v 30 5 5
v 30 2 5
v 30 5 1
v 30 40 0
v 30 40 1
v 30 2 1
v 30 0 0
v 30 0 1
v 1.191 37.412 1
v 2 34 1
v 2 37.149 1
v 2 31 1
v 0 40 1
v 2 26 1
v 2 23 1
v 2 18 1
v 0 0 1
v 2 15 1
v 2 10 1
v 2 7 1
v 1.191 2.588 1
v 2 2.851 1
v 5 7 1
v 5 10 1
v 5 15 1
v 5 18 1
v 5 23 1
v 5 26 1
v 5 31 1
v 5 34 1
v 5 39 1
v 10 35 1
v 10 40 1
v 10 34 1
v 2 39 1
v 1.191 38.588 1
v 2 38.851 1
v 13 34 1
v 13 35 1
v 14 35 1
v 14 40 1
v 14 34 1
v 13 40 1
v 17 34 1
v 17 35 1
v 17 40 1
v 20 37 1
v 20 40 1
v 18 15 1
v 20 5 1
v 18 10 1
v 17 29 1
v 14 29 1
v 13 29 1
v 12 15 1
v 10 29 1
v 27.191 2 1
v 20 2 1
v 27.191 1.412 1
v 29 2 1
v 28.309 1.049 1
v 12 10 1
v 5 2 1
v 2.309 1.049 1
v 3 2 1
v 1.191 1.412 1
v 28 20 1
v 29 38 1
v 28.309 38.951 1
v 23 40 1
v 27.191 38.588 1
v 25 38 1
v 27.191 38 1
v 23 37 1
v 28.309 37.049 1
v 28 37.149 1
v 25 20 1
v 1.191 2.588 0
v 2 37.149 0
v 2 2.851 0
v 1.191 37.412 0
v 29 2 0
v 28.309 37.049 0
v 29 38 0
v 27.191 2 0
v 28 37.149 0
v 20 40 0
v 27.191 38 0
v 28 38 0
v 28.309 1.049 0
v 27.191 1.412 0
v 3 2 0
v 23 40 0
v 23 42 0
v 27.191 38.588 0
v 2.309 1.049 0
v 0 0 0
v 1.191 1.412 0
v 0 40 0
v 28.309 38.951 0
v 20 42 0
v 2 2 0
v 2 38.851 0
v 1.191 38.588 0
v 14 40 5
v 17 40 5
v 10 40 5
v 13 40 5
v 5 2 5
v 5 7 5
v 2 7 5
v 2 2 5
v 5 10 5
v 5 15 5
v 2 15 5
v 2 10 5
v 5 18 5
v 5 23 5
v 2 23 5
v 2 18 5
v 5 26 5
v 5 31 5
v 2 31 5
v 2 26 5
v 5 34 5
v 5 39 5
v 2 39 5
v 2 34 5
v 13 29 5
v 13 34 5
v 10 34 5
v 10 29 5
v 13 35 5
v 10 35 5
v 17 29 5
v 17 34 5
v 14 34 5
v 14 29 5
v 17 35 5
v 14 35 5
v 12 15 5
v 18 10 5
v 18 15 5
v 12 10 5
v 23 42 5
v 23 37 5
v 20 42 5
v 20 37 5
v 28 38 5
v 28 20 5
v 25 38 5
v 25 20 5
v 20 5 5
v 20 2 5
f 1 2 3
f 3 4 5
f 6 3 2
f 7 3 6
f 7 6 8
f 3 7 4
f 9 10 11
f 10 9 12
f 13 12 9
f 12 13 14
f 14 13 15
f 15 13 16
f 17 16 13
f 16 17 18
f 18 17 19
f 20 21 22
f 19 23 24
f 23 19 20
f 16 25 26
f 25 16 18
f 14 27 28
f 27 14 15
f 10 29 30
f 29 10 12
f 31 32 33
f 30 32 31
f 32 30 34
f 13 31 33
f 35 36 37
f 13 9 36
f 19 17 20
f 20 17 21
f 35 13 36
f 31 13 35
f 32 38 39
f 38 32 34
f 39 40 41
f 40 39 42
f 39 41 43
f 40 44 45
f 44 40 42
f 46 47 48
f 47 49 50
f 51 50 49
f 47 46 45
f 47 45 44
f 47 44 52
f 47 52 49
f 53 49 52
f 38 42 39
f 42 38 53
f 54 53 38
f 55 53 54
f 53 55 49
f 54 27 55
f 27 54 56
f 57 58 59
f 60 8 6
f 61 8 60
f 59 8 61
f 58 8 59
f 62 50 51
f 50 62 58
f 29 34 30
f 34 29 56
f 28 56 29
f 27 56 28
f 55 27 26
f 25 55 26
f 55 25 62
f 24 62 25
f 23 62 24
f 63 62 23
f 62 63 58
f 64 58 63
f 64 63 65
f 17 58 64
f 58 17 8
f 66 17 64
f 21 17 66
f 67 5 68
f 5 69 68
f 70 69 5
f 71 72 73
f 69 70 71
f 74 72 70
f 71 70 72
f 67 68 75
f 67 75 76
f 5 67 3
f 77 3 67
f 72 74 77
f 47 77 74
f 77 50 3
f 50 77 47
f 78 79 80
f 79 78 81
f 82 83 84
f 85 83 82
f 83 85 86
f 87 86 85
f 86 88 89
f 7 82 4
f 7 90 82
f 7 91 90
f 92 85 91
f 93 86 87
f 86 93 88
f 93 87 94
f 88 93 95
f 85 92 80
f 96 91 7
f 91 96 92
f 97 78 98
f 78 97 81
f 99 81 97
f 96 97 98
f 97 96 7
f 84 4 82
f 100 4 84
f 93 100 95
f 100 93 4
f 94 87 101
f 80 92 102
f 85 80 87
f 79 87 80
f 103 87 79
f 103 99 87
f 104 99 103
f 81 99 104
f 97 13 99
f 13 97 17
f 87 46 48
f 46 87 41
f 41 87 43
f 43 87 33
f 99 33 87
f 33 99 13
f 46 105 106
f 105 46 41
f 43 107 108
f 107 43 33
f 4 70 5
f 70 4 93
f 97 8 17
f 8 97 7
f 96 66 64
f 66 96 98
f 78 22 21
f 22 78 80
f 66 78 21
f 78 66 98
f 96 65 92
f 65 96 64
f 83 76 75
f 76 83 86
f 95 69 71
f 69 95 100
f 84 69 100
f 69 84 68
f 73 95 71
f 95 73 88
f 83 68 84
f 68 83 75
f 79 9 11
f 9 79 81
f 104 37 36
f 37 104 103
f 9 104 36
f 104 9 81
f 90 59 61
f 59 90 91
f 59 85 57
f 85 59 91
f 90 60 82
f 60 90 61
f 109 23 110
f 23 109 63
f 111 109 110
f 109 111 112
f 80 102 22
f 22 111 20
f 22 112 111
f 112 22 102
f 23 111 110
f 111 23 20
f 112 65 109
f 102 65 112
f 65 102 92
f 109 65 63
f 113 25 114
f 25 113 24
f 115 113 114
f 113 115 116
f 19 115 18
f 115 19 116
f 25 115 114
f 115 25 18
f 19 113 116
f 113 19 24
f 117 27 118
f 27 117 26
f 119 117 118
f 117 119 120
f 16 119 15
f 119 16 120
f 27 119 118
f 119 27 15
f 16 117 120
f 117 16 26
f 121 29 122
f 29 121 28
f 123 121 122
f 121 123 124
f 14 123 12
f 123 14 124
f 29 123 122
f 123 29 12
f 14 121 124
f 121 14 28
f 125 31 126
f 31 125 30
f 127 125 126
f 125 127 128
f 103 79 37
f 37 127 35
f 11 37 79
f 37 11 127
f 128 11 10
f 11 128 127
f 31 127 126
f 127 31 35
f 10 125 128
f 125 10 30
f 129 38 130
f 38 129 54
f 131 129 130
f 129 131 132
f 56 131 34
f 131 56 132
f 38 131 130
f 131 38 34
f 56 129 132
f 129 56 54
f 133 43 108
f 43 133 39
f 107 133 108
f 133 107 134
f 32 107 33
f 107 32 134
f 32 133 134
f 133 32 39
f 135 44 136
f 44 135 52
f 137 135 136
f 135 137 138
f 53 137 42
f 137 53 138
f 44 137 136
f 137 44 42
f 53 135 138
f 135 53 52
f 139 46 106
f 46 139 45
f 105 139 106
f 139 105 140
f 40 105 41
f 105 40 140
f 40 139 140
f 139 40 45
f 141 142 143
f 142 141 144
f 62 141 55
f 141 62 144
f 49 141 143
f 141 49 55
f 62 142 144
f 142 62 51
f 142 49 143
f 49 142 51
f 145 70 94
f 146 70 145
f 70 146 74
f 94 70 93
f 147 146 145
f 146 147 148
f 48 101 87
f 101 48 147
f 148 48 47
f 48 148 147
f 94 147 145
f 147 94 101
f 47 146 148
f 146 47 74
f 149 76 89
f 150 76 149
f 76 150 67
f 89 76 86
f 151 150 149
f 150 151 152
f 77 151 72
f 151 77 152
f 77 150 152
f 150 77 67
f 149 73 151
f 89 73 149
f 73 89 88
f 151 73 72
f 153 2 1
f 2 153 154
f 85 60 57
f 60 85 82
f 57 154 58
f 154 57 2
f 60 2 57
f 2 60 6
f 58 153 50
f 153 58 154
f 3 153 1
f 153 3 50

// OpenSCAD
module pogo_pin () {
  color("Yellow") union() {
    cylinder (r=0.5, h=10);
    translate ([0, 0, 10]) cylinder (r=0.25, h=5);
  }
}

module rambo_board() {
  color("Green") difference() {
    cube([30, 40, 1]);
    translate([2, 2, -1]) cylinder (r=1, h=5);
    translate([28, 38, -1]) cylinder (r=1, h=5);
    translate([2, 38, -1]) cylinder (r=1, h=5);
    translate([28, 2, -1]) cylinder (r=1, h=5);
  }
}

module rambo_connector() {
  color("Gray") cube([3, 5, 5]);
}

module rambo_connectors() {
  /* motors */
  translate([2, 2, 0]) rambo_connector();
  translate([2, 10, 0]) rambo_connector();
  translate([2, 18, 0]) rambo_connector();
  translate([2, 26, 0]) rambo_connector();
  translate([2, 34, 0]) rambo_connector();
  /* endstops */
  translate([10, 29, 0]) rambo_connector();
  translate([10, 35, 0]) rambo_connector();
  translate([14, 29, 0]) rambo_connector();
  translate([14, 35, 0]) rambo_connector();
  /* Thermistors */
  translate([12, 10, 0]) rambo_connector();
  translate([15, 10, 0]) rambo_connector();
  /* USB */
  translate([20, 37, 0]) rambo_connector();
  /* Mosfets */
  translate([25, 20, 0]) rambo_connector();
  translate([25, 25, 0]) rambo_connector();
  translate([25, 30, 0]) rambo_connector();
  translate([25, 33, 0]) rambo_connector();
  /* Power */
  translate([25, 2, 0]) rotate([0, 0, 90]) rambo_connector();
  translate([30, 2, 0]) rotate([0, 0, 90]) rambo_connector();
}

module rambo_pins() {
  /* motors */
  translate([5, 5, 0]) pogo_pin();
  translate([5, 10, 0]) pogo_pin();
  translate([5, 15, 0]) pogo_pin();
  translate([5, 20, 0]) pogo_pin();
  translate([5, 25, 0]) pogo_pin();
  translate([5, 30, 0]) pogo_pin();
  translate([5, 35, 0]) pogo_pin();
  /* endstops */
  translate([12, 30, 0]) pogo_pin();
  translate([12, 32.5, 0]) pogo_pin();
  translate([12, 35, 0]) pogo_pin();
  translate([15, 30, 0]) pogo_pin();
  translate([15, 32.5, 0]) pogo_pin();
  translate([15, 35, 0]) pogo_pin();
  /* ISP */
  translate([20, 12.5, 0]) pogo_pin();
  translate([20, 15, 0]) pogo_pin();
  translate([20, 22.5, 0]) pogo_pin();
  translate([20, 25, 0]) pogo_pin();
  /* Power */
  translate([25, 5, 0]) pogo_pin();
  translate([20, 5, 0]) pogo_pin();
  /* Mosfets */
  translate([25, 20, 0]) pogo_pin();
  translate([25, 25, 0]) pogo_pin();
  translate([25, 35, 0]) pogo_pin();
}

module rambo(connectors=1, holes=0, pins=0) {
  if (connectors) {
    union() {
      rambo_board();
      rambo_connectors();
    }
  } else if (holes) {
    difference() {
      rambo_board();
      translate([0, 0, -1]) rambo_pins();
    }
  } else if (pins) {
    union() {
      rambo_board();
      rambo_pins();
    }
  } else {
    rambo_board();
  }
}

rambo(1, 0, 0);
